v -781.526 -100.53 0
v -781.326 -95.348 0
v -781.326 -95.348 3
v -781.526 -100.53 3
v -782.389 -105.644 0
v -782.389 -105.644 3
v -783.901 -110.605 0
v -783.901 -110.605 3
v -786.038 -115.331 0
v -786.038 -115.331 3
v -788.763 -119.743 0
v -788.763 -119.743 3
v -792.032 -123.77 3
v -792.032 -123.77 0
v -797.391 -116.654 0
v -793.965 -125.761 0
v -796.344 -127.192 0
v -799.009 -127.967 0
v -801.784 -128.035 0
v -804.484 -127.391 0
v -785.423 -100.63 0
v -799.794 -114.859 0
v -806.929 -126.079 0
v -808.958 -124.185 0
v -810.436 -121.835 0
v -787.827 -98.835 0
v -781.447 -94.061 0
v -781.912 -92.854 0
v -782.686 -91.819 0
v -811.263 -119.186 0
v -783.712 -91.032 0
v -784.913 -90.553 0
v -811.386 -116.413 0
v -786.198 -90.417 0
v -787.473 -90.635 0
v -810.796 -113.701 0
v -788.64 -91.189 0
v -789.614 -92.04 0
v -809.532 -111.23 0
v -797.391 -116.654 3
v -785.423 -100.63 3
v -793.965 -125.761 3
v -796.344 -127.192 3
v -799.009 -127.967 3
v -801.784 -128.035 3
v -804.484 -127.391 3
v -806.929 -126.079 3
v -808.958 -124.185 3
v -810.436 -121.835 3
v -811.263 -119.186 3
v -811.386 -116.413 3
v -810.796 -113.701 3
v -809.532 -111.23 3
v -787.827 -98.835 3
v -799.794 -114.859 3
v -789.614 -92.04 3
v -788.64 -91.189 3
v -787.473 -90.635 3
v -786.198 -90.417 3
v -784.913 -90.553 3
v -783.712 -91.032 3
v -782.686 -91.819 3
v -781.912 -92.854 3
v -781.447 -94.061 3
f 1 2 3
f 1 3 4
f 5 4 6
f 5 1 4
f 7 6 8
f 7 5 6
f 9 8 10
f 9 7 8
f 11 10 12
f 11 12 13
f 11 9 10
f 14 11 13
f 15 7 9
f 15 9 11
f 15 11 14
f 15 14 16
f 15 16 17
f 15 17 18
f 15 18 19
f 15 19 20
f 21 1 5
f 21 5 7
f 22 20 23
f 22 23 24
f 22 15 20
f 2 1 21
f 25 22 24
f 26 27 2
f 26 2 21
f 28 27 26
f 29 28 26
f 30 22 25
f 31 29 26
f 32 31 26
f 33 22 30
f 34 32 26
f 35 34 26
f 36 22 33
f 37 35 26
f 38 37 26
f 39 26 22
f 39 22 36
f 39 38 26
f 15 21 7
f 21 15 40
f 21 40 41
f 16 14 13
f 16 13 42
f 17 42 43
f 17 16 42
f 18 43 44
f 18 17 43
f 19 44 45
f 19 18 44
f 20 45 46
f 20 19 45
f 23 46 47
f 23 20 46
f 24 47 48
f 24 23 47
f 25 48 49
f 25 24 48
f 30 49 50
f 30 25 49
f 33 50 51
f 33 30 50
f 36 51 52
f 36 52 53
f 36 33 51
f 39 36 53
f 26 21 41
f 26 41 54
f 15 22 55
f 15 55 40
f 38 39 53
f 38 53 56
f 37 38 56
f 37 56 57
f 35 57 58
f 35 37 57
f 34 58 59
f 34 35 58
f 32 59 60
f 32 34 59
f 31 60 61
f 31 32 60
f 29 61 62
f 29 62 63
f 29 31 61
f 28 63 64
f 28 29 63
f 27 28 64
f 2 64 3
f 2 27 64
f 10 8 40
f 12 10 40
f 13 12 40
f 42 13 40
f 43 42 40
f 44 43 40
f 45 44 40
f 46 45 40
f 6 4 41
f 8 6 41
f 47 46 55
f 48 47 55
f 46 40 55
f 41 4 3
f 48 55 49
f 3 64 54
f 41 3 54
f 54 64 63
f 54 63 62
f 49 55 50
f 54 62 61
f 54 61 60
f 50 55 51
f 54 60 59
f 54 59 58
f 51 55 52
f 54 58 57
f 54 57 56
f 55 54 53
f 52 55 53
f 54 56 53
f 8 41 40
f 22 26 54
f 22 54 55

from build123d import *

# Parameters (mm, degrees)
BASE_EXTRUDE_DEPTH = 3


with BuildPart() as part:
    # Sketch1 → Base-Extrude (new body)
    with BuildSketch(Plane.XY):
        with BuildLine():
            Line((-809.531671811, -111.229676779), (-789.61413801, -92.039559057))
            ThreePointArc((-789.61413801, -92.039559057), (-784.29578657, -90.751569276), (-781.326120484, -95.347748455))
            ThreePointArc((-781.326120484, -95.347748455), (-783.901412566, -110.604895358), (-792.031629072, -123.769706047))
            ThreePointArc((-792.031629072, -123.769706047), (-806.92926697, -126.078902011), (-809.531671811, -111.229676779))
        make_face()
        Polygon((-797.390770347, -116.654380858), (-785.42322433, -100.630091722), (-787.826867701, -98.834959819), (-799.794413717, -114.859248956), align=None, mode=Mode.SUBTRACT)
    extrude(amount=BASE_EXTRUDE_DEPTH)


solid = part.part
